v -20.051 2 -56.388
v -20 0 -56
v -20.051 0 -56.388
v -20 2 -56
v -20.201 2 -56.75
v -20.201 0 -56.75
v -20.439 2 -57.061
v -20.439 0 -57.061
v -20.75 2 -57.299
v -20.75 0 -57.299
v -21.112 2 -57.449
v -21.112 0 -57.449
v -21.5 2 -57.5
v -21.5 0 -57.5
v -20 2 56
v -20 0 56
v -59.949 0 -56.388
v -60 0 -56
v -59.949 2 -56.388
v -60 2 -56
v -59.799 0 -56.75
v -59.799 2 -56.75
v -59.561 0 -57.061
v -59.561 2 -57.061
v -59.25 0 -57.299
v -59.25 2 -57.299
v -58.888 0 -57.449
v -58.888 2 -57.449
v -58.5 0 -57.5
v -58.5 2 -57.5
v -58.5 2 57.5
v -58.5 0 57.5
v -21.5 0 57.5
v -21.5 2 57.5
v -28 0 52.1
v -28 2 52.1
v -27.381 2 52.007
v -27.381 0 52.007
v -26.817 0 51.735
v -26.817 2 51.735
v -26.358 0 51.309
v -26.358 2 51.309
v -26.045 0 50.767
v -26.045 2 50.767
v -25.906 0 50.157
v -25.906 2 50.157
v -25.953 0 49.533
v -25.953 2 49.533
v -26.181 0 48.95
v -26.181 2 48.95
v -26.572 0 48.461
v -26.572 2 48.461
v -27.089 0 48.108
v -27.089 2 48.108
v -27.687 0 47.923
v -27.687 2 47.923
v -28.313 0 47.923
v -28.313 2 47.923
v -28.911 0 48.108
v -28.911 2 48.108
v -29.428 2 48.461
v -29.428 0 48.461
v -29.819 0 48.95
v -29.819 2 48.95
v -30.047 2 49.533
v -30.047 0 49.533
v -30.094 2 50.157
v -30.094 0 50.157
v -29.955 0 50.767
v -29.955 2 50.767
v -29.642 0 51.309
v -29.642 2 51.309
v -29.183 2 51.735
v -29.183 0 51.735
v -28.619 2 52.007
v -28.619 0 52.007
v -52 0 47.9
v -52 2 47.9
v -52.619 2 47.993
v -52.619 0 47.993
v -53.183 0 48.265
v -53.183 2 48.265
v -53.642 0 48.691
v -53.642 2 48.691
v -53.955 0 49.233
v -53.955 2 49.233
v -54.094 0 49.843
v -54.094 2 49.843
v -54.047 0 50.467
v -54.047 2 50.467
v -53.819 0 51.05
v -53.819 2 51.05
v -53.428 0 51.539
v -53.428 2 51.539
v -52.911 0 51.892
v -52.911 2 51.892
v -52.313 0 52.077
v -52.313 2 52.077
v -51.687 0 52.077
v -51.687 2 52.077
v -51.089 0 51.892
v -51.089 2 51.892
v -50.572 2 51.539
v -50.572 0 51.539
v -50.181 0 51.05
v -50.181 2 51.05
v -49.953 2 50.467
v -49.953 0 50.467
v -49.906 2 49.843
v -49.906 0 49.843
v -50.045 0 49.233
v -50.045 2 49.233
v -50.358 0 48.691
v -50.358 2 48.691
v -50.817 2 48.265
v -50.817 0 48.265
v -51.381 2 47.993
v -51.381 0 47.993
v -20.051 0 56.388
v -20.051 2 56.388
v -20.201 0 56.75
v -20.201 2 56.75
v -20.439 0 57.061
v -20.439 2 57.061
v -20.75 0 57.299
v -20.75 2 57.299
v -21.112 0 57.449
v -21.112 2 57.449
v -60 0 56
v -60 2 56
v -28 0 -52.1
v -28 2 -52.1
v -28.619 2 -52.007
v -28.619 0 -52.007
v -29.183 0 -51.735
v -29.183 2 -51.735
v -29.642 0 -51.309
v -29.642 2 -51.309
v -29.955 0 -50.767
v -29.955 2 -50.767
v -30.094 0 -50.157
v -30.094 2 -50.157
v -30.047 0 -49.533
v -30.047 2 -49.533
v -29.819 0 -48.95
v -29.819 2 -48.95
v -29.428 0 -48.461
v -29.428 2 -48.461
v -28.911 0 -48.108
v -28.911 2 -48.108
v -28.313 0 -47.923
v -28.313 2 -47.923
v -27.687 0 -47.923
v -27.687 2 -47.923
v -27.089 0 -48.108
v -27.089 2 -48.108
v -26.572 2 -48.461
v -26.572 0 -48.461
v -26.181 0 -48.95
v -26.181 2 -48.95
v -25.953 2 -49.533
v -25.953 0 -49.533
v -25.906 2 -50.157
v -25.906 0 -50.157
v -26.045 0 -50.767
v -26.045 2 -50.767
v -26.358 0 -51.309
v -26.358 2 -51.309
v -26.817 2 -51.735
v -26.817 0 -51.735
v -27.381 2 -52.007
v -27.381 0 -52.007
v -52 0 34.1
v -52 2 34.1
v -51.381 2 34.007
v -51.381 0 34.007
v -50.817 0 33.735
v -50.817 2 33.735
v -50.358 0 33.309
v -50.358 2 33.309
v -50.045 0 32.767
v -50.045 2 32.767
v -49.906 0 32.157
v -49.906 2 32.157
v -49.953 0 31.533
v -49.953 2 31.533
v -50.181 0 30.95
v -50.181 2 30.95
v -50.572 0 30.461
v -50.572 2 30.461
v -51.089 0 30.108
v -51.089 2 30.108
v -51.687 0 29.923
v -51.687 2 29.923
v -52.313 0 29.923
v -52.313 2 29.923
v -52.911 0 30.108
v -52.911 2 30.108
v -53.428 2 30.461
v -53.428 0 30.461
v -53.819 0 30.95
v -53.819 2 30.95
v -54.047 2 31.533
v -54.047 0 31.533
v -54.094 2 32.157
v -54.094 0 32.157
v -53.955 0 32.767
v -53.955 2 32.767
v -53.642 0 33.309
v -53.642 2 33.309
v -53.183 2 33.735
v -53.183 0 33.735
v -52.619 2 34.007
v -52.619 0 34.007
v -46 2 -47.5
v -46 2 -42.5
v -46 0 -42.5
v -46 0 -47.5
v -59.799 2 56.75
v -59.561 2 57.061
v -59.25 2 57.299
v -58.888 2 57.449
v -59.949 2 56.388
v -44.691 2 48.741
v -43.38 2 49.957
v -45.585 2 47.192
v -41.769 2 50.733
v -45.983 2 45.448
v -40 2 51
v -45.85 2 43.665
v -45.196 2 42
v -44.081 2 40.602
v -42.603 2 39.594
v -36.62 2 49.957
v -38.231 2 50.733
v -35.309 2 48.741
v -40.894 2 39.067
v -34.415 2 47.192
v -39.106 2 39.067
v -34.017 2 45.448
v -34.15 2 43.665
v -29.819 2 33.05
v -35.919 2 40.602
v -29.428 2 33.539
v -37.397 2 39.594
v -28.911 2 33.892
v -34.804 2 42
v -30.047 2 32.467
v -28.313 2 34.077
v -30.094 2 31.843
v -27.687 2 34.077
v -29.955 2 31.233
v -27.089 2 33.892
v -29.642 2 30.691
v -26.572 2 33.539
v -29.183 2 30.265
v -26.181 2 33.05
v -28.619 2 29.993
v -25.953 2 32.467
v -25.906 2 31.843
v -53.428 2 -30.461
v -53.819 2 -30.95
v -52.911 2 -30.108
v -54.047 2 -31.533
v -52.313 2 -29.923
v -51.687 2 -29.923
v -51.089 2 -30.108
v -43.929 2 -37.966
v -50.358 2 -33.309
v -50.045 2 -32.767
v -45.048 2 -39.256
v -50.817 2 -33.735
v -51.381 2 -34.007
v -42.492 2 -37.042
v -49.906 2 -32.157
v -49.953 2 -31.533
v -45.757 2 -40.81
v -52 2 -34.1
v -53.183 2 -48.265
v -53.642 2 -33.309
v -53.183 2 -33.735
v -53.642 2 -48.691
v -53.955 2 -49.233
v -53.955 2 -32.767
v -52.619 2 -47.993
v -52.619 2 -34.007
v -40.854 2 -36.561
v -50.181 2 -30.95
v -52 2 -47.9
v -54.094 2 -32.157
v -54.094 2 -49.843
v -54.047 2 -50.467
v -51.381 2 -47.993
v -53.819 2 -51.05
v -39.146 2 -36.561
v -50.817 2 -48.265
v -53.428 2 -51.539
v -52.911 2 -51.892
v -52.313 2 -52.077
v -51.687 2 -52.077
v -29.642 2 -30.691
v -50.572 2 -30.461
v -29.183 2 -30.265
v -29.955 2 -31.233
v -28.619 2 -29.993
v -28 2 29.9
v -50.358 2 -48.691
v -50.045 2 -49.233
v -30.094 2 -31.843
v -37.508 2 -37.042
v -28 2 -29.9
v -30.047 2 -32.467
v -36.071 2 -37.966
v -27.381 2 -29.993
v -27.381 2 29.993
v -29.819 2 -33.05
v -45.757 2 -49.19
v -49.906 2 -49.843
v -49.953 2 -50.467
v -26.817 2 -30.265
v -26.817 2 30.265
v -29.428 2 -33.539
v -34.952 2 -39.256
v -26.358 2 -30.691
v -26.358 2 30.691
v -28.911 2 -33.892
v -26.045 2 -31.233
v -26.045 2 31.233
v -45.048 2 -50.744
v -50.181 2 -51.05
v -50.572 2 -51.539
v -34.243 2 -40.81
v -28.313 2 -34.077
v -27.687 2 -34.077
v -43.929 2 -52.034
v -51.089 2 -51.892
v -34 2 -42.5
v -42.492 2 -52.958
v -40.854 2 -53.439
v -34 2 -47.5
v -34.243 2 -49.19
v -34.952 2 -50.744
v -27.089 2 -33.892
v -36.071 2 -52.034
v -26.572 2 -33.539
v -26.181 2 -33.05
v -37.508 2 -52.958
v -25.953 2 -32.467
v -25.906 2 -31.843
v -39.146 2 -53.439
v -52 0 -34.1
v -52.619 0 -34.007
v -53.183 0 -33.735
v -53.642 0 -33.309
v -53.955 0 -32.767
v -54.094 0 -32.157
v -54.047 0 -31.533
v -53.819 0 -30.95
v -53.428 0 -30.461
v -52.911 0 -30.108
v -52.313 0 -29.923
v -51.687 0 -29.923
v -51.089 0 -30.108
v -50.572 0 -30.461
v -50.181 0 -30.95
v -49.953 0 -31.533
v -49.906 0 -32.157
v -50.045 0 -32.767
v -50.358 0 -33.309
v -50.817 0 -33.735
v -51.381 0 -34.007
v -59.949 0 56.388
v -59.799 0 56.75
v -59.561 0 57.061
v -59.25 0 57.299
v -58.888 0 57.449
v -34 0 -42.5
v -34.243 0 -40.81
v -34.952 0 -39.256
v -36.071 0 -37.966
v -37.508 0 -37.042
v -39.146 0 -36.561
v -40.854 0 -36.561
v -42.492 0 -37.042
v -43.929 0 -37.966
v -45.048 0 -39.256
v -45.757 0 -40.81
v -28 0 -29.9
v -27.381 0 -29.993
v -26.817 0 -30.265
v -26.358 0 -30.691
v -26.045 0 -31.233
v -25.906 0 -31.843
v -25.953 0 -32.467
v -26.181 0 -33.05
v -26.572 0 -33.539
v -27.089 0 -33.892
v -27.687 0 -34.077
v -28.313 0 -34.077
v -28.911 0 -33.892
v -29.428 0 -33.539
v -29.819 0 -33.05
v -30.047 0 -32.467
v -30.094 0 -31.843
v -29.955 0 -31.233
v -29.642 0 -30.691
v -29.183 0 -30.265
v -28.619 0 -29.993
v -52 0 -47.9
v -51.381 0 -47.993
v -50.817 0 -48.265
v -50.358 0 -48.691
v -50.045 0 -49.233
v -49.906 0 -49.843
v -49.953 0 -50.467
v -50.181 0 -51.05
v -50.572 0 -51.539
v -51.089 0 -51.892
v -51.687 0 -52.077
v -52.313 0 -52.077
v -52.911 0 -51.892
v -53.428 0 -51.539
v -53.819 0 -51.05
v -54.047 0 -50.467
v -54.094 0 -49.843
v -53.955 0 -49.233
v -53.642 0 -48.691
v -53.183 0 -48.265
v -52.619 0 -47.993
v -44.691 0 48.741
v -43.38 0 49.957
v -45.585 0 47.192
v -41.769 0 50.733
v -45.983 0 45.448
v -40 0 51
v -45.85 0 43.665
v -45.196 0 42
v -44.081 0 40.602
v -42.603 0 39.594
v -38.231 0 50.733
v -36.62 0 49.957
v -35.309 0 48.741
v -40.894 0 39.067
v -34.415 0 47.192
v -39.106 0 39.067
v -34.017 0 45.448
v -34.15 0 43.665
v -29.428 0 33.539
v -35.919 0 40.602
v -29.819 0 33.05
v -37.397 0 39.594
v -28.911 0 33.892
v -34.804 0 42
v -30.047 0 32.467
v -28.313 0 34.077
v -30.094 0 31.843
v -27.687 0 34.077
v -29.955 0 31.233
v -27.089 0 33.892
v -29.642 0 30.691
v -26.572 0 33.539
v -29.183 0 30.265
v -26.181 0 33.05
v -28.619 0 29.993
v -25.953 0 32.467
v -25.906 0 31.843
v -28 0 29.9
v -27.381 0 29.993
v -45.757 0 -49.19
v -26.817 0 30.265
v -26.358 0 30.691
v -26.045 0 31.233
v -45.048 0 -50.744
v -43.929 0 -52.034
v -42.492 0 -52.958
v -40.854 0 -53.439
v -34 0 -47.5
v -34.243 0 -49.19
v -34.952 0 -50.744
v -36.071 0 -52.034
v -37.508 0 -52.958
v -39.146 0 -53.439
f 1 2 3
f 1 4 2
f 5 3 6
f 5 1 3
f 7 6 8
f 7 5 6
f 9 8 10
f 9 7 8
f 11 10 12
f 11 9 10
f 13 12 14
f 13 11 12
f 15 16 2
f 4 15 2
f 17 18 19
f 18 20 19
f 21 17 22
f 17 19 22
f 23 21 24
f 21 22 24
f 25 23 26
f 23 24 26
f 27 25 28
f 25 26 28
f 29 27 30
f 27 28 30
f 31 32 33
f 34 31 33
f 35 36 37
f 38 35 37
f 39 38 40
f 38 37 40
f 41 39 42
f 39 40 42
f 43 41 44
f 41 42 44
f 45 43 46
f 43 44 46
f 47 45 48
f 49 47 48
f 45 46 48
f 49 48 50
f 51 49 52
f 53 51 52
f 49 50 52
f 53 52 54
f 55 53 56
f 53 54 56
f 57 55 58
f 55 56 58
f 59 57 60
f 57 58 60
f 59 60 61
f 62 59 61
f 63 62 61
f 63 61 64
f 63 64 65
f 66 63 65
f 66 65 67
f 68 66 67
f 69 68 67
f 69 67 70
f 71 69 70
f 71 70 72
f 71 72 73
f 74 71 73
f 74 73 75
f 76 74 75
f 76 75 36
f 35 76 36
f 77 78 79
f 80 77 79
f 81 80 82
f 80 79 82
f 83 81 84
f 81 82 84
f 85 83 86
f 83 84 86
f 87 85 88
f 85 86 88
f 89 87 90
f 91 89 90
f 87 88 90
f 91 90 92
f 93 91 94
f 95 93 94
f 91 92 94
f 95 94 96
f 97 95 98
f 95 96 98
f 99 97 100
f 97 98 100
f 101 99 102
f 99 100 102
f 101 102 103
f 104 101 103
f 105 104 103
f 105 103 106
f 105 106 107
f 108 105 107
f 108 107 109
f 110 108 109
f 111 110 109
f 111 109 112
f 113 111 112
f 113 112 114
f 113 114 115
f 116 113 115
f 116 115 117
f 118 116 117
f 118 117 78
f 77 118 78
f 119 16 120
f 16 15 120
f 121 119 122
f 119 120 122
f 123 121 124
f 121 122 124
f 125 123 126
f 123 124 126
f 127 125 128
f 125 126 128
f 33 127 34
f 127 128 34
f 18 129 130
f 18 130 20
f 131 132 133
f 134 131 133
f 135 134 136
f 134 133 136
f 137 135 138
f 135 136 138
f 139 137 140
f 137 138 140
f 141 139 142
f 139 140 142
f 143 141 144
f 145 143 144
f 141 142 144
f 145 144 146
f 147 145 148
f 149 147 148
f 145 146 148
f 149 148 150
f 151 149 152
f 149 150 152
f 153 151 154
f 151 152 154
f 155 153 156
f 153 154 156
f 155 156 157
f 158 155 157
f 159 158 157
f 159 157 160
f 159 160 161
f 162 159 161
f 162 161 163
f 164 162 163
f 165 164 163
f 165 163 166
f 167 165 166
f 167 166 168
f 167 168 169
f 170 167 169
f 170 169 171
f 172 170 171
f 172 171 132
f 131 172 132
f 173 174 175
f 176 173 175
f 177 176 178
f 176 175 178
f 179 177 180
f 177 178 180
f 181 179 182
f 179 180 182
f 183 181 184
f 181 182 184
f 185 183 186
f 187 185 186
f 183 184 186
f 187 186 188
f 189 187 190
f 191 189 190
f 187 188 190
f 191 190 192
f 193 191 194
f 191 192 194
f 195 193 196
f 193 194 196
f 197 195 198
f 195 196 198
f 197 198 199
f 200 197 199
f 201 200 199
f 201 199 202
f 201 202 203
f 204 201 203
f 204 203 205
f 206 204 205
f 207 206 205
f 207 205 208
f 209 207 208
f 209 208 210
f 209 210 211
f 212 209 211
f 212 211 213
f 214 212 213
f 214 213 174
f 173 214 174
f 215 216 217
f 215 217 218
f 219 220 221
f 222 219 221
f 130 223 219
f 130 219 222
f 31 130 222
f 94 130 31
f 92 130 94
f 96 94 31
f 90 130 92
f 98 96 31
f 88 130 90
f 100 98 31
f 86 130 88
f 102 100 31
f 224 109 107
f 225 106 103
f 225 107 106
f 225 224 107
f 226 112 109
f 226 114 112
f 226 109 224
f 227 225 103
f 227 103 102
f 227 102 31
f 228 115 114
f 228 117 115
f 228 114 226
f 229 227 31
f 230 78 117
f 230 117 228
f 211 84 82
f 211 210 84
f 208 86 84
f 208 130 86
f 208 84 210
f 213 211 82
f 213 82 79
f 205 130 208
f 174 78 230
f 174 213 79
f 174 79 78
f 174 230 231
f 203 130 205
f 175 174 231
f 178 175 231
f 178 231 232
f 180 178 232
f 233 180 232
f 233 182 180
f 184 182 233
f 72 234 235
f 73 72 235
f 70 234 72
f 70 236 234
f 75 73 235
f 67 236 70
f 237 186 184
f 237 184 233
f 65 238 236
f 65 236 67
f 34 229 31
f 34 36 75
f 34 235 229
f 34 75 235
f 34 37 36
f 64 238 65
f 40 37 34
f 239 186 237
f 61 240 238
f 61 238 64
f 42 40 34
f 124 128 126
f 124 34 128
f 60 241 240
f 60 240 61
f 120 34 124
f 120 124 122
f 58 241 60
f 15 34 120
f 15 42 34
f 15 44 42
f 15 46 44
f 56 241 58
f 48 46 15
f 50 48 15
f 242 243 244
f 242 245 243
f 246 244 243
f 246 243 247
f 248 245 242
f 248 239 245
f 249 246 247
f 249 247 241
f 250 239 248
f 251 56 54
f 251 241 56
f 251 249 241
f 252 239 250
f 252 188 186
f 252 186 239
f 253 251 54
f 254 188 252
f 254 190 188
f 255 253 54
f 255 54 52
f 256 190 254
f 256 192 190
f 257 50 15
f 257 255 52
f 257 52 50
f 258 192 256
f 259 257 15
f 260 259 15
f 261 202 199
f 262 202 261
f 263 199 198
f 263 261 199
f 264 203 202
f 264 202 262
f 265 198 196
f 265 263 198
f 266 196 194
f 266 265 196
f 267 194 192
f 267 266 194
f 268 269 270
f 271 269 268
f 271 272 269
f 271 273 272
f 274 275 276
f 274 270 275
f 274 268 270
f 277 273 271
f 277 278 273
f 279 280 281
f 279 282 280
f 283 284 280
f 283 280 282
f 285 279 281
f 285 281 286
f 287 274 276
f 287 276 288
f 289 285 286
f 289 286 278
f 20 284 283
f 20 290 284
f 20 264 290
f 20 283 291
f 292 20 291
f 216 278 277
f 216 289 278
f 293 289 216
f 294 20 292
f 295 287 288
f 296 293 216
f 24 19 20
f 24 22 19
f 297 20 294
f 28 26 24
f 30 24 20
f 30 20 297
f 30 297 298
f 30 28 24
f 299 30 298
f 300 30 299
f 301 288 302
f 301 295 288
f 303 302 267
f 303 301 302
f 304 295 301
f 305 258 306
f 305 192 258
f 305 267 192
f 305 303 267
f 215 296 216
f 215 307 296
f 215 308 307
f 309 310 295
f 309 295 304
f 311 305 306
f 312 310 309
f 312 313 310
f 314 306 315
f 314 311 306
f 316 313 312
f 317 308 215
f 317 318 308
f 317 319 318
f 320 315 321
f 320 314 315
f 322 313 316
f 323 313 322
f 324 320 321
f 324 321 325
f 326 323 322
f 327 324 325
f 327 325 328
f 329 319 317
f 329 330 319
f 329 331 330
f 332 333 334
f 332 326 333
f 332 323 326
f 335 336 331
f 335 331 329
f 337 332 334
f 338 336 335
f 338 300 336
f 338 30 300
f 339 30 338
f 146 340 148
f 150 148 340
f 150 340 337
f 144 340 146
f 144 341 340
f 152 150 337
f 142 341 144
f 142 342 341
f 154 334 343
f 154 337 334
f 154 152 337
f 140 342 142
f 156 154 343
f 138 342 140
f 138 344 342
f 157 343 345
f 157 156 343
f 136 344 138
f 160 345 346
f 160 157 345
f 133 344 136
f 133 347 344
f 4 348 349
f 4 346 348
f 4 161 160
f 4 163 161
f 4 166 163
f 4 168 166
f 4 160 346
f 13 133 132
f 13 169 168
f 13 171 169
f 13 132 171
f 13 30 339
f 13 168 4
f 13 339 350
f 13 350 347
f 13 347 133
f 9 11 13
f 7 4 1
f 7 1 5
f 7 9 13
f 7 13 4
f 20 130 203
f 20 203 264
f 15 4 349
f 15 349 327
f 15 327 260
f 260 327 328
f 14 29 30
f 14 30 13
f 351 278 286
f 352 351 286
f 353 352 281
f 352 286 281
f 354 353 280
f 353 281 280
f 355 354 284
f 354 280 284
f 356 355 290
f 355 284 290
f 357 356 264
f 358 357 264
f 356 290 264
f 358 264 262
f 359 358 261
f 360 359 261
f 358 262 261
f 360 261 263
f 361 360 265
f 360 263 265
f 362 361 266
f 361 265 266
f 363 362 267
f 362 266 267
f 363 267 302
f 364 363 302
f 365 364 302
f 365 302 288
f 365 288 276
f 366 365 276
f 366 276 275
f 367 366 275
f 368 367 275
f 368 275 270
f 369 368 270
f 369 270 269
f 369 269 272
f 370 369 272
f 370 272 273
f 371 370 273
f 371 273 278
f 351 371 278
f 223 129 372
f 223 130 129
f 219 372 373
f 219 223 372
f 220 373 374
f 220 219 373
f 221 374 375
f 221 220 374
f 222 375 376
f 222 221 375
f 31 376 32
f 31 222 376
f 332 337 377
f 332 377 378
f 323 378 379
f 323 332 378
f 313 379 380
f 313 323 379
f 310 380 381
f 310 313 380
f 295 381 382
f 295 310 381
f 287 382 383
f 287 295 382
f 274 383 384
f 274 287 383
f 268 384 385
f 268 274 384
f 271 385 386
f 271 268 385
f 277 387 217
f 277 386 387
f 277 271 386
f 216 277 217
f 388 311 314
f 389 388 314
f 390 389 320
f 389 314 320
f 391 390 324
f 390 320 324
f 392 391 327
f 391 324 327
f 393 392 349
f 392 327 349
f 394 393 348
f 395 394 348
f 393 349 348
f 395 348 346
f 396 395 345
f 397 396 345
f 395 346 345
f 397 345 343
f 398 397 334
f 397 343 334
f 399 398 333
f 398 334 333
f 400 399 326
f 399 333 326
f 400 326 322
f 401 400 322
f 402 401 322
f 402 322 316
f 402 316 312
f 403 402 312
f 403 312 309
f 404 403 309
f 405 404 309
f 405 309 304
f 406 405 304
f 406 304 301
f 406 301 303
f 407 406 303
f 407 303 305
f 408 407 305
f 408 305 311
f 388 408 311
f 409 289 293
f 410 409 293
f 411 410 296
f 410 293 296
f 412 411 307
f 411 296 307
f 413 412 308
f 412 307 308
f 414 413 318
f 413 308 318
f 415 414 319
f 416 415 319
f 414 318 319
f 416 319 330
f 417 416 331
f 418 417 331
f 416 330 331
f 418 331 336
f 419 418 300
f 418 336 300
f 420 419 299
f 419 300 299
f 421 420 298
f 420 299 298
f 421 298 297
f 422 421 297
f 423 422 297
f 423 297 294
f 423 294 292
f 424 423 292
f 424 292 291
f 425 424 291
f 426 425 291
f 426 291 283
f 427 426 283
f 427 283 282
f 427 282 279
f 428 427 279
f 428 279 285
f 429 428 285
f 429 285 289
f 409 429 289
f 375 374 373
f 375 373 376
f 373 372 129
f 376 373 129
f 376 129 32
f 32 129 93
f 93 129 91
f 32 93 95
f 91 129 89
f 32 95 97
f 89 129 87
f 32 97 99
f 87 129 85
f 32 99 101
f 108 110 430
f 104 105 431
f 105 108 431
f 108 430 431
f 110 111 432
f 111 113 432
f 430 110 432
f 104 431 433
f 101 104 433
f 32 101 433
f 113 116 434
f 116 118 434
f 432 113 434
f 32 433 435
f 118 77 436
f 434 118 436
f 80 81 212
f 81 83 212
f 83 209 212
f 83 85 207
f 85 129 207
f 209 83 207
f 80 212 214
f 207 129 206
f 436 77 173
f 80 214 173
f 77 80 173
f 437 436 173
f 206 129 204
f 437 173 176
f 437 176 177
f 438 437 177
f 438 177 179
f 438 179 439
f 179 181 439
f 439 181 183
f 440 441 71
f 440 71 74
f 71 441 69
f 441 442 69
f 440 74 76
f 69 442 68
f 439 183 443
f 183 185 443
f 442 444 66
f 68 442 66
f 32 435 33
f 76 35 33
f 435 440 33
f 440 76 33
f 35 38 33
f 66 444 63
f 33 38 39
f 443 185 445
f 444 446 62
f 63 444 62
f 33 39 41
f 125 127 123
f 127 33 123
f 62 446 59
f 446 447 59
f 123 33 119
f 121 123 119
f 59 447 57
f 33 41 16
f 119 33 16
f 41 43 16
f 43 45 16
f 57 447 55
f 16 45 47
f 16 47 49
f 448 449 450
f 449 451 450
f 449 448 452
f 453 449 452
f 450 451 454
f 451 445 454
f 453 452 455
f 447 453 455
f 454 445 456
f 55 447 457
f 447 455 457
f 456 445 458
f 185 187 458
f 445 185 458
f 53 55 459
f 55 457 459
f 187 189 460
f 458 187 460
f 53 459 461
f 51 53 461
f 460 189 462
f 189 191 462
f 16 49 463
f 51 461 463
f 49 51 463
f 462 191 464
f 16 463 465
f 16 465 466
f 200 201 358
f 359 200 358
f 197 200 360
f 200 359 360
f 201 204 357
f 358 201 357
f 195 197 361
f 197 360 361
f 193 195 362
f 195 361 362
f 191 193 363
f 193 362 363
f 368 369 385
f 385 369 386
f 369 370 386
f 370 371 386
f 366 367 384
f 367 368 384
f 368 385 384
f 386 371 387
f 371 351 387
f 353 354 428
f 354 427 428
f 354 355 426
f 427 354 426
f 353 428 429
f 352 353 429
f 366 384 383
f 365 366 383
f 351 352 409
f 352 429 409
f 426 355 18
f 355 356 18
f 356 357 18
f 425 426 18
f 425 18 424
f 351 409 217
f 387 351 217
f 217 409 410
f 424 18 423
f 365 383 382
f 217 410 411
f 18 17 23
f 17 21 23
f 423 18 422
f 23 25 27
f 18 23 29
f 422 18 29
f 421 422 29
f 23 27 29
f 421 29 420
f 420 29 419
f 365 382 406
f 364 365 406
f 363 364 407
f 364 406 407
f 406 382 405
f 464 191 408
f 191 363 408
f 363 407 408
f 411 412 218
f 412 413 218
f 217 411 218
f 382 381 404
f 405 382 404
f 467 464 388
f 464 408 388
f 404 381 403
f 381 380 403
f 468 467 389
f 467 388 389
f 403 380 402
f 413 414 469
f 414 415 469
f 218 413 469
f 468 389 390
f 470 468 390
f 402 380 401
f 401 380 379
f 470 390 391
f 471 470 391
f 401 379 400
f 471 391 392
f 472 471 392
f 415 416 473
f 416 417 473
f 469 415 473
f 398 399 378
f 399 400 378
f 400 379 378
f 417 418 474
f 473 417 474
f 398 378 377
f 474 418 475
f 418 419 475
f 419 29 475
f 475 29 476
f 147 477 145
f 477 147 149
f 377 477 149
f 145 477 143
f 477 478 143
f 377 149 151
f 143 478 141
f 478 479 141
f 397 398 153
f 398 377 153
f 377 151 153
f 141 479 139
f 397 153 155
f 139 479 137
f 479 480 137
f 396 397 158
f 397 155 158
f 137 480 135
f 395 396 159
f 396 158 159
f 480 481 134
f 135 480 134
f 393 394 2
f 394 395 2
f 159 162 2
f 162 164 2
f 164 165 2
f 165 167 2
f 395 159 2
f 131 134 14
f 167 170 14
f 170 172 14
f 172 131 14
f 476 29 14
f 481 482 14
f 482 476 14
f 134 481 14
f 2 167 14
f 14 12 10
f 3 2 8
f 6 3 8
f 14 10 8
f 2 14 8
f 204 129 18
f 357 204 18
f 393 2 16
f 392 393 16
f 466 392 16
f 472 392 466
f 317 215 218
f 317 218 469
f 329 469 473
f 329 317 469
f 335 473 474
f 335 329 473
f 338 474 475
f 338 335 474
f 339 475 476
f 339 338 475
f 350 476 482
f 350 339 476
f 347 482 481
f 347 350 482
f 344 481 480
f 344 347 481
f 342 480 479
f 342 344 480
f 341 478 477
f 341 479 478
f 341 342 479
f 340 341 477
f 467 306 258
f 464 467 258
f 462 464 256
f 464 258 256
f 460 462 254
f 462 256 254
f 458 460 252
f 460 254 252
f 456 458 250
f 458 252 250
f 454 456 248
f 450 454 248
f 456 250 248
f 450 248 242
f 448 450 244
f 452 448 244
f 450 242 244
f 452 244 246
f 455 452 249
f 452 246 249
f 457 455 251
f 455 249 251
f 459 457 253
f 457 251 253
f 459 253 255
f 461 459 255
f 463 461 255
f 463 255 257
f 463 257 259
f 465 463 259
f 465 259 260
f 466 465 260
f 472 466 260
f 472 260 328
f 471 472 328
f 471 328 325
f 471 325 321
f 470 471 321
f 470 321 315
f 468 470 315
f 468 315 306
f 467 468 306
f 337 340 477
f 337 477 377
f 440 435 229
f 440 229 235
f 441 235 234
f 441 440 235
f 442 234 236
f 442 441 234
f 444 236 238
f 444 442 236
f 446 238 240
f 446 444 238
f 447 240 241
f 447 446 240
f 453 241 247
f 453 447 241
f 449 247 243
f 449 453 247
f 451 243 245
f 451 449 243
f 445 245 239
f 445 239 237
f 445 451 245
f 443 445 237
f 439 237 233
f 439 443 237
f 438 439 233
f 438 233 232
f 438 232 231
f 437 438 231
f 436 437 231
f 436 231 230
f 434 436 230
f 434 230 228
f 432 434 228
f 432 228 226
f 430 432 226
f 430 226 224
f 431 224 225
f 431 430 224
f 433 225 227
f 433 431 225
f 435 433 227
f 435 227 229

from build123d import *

# Parameters (mm, degrees)
SKETCH1_W           = 40
SKETCH1_H           = 115
SKETCH1_R           = 6
BOSS_EXTRUDE1_DEPTH = 2
SKETCH2_R           = 2.1
CUT_EXTRUDE1_DEPTH  = 84.127913483
CUT_EXTRUDE2_DEPTH  = 84.127913483
FILLET1_R           = 1.5


with BuildPart() as part:
    # Sketch1 → Boss-Extrude1 (new body)
    with BuildSketch(Plane(origin=(0, 0, 0), x_dir=(1, 0, 0), z_dir=(0, 1, 0))):
        with Locations((-40, 0)):
            Rectangle(SKETCH1_W, SKETCH1_H)
        with Locations(Location((-40, -45, 0), (0, 0, 270))):
            Circle(SKETCH1_R, mode=Mode.SUBTRACT)
        with Locations(Location((-40, 45, 0), (0, 0, 270))):
            Circle(SKETCH1_R, mode=Mode.SUBTRACT)
    extrude(amount=BOSS_EXTRUDE1_DEPTH)

    # Sketch2 → Cut-Extrude1 (cut, through all)
    with BuildSketch(Plane(origin=(0, 2, 0), x_dir=(1, 0, 0), z_dir=(0, 1, 0))):
        with Locations(Location((-52, -32, 0), (0, 0, 270))):
            Circle(SKETCH2_R)
        with Locations(Location((-28, -32, 0), (0, 0, 90))):
            Circle(SKETCH2_R)
        with Locations(Location((-28, -50, 0), (0, 0, 270))):
            Circle(SKETCH2_R)
        with Locations(Location((-52, -50, 0), (0, 0, 90))):
            Circle(SKETCH2_R)
        with Locations(Location((-28, 50, 0), (0, 0, 90))):
            Circle(SKETCH2_R)
        with Locations(Location((-52, 50, 0), (0, 0, 270))):
            Circle(SKETCH2_R)
        with Locations(Location((-52, 32, 0), (0, 0, 90))):
            Circle(SKETCH2_R)
        with Locations(Location((-28, 32, 0), (0, 0, 270))):
            Circle(SKETCH2_R)
    extrude(amount=-CUT_EXTRUDE1_DEPTH, mode=Mode.SUBTRACT)

    # Sketch3 → Cut-Extrude2 (cut, through all)
    with BuildSketch(Plane(origin=(0, 2, 0), x_dir=(1, 0, 0), z_dir=(0, 1, 0))):
        with BuildLine():
            Line((-34, 47.5), (-34, 42.5))
            ThreePointArc((-34, 42.5), (-40, 36.5), (-46, 42.5))
            Line((-46, 42.5), (-46, 47.5))
            ThreePointArc((-46, 47.5), (-40, 53.5), (-34, 47.5))
        make_face()
    extrude(amount=-CUT_EXTRUDE2_DEPTH, mode=Mode.SUBTRACT)

    # Fillet1
    fillet1_edges = [part.edges().sort_by_distance(p)[0] for p in [
        (-20, 1, 57.5),
        (-60, 1, 57.5),
        (-60, 1, -57.5),
        (-20, 1, -57.5),
    ]]
    fillet(fillet1_edges, radius=FILLET1_R)


solid = part.part
